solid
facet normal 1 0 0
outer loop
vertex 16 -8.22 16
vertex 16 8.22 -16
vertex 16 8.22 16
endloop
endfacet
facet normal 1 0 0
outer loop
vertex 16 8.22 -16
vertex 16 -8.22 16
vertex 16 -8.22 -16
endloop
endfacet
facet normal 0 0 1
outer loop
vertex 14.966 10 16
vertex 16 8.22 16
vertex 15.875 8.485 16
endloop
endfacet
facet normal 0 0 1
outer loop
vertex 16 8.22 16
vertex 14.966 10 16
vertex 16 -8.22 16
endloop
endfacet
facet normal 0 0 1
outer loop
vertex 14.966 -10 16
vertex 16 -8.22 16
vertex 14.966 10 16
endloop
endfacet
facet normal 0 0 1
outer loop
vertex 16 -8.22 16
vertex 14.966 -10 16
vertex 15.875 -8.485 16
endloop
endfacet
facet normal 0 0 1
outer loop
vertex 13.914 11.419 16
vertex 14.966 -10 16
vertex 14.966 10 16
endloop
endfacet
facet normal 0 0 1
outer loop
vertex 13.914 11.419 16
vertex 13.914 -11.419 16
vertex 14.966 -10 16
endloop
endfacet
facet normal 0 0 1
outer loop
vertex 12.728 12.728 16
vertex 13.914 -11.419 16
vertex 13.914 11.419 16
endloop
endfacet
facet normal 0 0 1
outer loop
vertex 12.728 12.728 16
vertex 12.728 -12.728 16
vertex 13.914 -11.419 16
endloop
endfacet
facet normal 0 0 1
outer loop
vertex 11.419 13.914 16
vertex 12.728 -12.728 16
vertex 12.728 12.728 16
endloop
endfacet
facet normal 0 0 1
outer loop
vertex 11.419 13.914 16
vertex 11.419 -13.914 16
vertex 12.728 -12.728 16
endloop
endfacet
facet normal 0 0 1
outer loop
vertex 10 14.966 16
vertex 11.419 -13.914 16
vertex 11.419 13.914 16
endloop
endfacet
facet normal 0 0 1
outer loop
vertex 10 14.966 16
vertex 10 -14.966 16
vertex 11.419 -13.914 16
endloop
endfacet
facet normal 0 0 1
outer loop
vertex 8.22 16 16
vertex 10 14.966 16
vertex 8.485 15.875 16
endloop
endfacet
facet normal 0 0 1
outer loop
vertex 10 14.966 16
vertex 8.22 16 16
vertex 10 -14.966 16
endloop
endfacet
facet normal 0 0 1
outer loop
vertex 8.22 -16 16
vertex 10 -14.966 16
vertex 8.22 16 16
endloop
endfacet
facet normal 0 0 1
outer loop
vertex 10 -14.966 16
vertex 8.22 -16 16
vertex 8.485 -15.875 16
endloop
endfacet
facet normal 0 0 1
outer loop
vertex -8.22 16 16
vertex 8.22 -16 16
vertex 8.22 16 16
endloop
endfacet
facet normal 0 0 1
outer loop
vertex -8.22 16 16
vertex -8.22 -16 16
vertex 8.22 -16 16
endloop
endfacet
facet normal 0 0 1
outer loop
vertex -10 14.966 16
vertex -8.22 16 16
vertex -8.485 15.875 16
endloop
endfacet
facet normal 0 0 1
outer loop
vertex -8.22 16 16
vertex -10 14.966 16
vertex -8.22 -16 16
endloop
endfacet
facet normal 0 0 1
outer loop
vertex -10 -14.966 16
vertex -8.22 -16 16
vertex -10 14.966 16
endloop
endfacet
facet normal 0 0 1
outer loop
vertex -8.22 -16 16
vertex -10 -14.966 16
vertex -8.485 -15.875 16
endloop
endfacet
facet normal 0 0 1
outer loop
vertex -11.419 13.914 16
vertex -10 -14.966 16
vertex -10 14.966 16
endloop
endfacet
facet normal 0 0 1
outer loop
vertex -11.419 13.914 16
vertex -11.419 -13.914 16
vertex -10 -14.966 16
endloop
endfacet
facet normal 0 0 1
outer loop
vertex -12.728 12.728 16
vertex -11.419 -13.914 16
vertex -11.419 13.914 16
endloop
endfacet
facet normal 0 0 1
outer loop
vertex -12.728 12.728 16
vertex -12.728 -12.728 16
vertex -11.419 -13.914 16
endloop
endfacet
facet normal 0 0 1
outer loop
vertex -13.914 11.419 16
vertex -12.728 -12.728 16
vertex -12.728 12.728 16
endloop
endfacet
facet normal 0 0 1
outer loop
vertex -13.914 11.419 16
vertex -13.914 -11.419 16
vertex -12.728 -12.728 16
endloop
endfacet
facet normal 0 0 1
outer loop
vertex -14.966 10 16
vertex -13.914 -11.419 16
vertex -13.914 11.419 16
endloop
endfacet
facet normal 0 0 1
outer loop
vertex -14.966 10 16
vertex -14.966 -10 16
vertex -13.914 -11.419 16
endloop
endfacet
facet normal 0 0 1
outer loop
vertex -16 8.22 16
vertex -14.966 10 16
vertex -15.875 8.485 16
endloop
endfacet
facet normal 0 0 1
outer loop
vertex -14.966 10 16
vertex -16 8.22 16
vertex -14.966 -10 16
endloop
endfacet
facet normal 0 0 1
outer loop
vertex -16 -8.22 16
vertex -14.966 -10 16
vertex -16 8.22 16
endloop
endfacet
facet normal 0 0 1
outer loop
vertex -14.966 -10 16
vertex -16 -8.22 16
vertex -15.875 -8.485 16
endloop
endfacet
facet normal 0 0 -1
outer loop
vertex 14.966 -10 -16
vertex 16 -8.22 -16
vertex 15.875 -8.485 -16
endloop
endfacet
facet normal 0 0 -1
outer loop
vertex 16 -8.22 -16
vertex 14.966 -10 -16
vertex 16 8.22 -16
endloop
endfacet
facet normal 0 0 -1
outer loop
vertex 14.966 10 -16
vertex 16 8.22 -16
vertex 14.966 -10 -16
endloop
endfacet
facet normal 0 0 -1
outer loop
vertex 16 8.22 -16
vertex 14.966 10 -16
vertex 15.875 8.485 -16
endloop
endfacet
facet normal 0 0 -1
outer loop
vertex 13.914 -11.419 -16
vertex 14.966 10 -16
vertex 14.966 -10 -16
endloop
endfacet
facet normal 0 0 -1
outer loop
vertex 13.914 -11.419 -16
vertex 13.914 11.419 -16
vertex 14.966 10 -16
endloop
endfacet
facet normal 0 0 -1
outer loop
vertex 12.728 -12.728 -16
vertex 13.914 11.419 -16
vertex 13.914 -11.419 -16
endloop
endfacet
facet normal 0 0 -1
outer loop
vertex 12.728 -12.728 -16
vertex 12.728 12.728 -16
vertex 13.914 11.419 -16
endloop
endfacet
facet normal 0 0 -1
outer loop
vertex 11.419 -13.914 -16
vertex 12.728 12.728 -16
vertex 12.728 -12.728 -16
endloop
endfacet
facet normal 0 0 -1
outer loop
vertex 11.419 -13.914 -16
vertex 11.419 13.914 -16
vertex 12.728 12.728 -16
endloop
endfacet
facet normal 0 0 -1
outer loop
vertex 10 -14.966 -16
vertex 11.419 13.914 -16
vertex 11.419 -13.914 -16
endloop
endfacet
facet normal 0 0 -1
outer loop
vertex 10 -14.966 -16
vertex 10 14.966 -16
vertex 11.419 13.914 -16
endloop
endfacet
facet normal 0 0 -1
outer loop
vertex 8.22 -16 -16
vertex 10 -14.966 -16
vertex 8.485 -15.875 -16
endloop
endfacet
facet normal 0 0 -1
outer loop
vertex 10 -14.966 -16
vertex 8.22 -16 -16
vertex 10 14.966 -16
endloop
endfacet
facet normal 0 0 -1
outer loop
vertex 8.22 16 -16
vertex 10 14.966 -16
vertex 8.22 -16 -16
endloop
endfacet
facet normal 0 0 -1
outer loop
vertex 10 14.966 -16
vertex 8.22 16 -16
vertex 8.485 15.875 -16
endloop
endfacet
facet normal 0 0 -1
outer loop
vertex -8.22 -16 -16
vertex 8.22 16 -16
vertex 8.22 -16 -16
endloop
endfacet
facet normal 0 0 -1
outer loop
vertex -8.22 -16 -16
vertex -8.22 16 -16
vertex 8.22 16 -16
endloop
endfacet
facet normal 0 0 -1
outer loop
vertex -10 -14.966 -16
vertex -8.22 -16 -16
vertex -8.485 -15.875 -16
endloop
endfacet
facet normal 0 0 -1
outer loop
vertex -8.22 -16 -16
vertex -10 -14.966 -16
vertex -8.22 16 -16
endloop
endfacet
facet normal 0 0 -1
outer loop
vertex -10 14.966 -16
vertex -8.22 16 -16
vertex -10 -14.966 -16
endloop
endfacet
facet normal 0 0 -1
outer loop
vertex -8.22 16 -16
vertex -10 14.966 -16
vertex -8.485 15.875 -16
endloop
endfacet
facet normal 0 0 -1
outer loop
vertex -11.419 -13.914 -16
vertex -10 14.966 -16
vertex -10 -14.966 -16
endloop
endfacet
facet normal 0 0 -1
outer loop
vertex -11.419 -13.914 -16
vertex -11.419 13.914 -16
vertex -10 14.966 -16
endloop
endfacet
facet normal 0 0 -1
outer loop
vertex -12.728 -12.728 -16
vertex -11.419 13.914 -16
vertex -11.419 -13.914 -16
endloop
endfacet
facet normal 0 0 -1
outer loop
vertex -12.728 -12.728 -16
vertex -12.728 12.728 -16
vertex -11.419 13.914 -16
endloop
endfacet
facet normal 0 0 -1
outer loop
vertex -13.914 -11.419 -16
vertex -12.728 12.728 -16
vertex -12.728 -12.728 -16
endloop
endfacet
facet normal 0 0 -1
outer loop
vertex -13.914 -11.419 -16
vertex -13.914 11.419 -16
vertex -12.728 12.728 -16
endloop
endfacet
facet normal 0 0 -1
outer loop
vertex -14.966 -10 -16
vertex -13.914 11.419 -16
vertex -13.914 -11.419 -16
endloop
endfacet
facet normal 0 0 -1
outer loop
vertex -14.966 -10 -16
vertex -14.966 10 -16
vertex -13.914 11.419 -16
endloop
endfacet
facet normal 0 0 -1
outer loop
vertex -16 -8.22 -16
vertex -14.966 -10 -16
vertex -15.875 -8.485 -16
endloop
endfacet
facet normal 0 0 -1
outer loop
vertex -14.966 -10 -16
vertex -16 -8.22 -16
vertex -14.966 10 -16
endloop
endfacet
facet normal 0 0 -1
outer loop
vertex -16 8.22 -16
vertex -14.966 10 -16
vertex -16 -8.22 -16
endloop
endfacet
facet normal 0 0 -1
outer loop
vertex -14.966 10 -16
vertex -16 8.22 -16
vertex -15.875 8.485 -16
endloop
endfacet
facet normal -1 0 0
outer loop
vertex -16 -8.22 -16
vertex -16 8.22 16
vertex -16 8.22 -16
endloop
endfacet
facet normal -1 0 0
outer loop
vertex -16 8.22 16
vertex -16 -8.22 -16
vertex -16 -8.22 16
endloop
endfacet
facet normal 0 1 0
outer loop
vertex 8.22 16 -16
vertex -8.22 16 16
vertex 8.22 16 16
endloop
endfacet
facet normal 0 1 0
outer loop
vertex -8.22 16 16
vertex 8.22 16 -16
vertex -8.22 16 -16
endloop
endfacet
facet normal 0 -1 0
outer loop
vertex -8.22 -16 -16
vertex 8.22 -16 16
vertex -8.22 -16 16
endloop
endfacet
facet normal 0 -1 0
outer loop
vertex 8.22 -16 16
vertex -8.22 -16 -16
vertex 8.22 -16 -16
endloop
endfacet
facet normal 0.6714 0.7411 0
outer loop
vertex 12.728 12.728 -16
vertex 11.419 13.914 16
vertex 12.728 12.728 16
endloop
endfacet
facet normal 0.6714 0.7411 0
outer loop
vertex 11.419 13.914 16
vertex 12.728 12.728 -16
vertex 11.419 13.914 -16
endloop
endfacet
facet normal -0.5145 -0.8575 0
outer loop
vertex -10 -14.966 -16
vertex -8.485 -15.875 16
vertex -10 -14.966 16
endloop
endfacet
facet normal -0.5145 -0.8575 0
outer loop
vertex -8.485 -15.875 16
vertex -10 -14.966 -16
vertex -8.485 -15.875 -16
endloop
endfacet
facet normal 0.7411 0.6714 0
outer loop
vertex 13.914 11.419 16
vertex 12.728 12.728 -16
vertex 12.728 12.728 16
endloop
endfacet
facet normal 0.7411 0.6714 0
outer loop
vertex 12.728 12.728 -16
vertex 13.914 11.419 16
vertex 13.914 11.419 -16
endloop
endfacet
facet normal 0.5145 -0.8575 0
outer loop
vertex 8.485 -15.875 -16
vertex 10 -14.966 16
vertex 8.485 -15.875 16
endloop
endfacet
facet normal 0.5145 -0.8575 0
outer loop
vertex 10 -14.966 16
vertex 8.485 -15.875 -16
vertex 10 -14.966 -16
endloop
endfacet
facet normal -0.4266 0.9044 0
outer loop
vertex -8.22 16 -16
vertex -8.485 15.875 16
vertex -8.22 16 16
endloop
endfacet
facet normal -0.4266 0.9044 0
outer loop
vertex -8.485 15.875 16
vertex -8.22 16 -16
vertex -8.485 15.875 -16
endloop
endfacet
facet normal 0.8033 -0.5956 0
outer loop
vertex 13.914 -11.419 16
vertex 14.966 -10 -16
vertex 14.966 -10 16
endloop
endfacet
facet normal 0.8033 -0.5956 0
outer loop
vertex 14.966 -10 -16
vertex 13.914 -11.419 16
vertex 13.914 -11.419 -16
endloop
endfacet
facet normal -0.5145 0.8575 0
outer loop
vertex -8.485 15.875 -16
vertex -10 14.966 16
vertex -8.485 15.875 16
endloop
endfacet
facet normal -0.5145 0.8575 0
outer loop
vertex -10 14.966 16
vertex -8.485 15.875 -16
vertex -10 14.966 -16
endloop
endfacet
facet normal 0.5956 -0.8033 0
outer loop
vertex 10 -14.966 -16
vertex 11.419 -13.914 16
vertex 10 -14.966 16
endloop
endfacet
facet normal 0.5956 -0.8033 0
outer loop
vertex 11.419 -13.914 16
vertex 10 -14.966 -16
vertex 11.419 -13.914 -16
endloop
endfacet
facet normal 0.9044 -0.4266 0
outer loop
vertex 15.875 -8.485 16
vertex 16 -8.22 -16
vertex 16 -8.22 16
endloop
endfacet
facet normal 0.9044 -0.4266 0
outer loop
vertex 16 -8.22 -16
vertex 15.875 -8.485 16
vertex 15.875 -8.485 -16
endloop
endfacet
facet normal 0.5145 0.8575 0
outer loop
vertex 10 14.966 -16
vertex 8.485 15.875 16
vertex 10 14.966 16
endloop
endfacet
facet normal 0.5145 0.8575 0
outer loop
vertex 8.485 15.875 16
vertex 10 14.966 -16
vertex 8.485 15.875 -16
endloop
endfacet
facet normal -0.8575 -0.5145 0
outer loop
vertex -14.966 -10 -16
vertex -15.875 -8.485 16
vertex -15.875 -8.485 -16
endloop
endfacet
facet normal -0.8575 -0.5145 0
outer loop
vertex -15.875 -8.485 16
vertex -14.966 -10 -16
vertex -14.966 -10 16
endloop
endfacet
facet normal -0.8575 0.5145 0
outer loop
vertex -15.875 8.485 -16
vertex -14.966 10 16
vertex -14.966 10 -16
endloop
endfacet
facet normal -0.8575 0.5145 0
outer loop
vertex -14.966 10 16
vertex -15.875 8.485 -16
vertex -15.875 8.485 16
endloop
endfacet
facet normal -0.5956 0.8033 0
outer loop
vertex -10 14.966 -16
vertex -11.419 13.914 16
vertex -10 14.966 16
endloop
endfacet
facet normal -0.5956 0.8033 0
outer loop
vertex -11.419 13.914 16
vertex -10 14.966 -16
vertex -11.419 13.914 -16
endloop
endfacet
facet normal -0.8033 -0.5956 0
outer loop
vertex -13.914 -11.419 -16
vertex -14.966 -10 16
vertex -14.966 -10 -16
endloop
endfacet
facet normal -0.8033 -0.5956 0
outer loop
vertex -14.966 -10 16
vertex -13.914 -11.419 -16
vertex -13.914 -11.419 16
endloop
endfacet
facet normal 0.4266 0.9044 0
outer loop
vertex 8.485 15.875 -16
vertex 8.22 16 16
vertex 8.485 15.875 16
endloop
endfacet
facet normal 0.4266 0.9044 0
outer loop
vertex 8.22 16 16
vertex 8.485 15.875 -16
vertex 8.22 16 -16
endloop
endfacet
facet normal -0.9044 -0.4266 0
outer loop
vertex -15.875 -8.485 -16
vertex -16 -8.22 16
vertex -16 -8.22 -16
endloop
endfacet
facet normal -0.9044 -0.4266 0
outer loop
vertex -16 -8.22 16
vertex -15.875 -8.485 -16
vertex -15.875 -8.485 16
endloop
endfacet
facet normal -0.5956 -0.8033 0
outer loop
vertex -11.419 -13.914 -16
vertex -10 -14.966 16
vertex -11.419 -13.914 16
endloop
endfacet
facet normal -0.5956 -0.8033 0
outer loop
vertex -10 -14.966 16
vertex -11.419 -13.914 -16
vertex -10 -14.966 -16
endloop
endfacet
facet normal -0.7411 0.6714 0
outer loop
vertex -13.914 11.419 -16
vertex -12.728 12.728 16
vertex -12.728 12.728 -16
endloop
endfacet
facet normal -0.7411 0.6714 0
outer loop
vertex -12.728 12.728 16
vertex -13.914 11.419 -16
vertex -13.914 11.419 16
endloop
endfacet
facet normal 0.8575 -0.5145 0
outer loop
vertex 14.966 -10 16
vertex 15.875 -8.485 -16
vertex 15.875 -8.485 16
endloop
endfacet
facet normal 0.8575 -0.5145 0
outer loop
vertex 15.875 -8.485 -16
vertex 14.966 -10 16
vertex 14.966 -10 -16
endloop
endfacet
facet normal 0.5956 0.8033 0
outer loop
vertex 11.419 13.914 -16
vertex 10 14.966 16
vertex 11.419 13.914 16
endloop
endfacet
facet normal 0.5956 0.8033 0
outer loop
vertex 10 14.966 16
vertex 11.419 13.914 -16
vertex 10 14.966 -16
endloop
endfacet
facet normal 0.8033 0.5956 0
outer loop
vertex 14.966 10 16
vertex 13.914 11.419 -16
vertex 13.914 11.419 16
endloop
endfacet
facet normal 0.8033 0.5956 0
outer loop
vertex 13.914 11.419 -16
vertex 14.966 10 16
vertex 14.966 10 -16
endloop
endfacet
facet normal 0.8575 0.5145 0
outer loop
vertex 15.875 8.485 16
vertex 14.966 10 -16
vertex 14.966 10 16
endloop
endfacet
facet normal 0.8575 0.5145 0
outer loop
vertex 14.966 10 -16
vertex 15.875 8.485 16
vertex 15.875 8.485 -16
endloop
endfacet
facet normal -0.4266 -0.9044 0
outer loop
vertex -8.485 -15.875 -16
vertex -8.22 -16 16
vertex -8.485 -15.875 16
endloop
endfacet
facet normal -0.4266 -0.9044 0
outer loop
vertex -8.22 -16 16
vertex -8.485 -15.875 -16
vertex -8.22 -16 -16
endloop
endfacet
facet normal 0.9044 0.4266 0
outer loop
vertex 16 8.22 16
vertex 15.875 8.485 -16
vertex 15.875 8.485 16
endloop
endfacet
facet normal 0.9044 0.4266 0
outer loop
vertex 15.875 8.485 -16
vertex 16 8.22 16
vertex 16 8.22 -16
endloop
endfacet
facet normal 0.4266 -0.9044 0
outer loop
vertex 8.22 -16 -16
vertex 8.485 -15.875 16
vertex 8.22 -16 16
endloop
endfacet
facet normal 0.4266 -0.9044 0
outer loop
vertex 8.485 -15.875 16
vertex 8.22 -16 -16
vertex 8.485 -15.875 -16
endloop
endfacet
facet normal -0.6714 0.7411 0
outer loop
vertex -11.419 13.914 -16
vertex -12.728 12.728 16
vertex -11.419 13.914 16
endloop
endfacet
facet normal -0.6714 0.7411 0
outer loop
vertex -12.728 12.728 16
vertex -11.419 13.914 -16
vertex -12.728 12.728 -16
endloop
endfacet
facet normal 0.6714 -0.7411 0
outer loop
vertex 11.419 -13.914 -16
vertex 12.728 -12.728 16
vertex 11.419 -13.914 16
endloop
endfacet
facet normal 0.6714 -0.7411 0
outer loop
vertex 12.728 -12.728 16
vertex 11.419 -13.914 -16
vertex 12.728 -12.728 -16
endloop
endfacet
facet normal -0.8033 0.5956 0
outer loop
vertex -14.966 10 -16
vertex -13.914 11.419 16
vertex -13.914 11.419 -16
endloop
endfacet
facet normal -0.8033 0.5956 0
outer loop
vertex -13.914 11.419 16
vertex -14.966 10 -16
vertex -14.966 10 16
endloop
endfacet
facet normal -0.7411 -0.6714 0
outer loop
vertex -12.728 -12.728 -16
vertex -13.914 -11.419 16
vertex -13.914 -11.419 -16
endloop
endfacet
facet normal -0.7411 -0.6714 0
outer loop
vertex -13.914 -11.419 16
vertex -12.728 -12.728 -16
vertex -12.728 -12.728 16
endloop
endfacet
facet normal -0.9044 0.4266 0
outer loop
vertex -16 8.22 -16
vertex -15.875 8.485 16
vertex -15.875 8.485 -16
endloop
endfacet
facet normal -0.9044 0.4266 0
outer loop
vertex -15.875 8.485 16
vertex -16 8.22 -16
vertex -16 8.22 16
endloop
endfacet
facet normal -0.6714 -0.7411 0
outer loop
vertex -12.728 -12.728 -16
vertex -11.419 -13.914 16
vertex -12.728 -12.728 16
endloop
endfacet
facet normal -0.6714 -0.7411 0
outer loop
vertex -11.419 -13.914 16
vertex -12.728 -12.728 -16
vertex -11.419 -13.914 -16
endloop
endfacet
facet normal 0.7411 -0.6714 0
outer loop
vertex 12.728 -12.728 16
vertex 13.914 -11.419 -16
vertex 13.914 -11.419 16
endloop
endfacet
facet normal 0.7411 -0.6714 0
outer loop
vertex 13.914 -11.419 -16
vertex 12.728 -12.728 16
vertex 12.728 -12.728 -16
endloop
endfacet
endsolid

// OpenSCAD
// Generated with SolidPython2 for OpenSCAD task-024
$fn = 64;

intersection() {
	cube(center = true, size = [32, 32, 32]);
	cylinder(center = true, h = 40, r = 18);
}
